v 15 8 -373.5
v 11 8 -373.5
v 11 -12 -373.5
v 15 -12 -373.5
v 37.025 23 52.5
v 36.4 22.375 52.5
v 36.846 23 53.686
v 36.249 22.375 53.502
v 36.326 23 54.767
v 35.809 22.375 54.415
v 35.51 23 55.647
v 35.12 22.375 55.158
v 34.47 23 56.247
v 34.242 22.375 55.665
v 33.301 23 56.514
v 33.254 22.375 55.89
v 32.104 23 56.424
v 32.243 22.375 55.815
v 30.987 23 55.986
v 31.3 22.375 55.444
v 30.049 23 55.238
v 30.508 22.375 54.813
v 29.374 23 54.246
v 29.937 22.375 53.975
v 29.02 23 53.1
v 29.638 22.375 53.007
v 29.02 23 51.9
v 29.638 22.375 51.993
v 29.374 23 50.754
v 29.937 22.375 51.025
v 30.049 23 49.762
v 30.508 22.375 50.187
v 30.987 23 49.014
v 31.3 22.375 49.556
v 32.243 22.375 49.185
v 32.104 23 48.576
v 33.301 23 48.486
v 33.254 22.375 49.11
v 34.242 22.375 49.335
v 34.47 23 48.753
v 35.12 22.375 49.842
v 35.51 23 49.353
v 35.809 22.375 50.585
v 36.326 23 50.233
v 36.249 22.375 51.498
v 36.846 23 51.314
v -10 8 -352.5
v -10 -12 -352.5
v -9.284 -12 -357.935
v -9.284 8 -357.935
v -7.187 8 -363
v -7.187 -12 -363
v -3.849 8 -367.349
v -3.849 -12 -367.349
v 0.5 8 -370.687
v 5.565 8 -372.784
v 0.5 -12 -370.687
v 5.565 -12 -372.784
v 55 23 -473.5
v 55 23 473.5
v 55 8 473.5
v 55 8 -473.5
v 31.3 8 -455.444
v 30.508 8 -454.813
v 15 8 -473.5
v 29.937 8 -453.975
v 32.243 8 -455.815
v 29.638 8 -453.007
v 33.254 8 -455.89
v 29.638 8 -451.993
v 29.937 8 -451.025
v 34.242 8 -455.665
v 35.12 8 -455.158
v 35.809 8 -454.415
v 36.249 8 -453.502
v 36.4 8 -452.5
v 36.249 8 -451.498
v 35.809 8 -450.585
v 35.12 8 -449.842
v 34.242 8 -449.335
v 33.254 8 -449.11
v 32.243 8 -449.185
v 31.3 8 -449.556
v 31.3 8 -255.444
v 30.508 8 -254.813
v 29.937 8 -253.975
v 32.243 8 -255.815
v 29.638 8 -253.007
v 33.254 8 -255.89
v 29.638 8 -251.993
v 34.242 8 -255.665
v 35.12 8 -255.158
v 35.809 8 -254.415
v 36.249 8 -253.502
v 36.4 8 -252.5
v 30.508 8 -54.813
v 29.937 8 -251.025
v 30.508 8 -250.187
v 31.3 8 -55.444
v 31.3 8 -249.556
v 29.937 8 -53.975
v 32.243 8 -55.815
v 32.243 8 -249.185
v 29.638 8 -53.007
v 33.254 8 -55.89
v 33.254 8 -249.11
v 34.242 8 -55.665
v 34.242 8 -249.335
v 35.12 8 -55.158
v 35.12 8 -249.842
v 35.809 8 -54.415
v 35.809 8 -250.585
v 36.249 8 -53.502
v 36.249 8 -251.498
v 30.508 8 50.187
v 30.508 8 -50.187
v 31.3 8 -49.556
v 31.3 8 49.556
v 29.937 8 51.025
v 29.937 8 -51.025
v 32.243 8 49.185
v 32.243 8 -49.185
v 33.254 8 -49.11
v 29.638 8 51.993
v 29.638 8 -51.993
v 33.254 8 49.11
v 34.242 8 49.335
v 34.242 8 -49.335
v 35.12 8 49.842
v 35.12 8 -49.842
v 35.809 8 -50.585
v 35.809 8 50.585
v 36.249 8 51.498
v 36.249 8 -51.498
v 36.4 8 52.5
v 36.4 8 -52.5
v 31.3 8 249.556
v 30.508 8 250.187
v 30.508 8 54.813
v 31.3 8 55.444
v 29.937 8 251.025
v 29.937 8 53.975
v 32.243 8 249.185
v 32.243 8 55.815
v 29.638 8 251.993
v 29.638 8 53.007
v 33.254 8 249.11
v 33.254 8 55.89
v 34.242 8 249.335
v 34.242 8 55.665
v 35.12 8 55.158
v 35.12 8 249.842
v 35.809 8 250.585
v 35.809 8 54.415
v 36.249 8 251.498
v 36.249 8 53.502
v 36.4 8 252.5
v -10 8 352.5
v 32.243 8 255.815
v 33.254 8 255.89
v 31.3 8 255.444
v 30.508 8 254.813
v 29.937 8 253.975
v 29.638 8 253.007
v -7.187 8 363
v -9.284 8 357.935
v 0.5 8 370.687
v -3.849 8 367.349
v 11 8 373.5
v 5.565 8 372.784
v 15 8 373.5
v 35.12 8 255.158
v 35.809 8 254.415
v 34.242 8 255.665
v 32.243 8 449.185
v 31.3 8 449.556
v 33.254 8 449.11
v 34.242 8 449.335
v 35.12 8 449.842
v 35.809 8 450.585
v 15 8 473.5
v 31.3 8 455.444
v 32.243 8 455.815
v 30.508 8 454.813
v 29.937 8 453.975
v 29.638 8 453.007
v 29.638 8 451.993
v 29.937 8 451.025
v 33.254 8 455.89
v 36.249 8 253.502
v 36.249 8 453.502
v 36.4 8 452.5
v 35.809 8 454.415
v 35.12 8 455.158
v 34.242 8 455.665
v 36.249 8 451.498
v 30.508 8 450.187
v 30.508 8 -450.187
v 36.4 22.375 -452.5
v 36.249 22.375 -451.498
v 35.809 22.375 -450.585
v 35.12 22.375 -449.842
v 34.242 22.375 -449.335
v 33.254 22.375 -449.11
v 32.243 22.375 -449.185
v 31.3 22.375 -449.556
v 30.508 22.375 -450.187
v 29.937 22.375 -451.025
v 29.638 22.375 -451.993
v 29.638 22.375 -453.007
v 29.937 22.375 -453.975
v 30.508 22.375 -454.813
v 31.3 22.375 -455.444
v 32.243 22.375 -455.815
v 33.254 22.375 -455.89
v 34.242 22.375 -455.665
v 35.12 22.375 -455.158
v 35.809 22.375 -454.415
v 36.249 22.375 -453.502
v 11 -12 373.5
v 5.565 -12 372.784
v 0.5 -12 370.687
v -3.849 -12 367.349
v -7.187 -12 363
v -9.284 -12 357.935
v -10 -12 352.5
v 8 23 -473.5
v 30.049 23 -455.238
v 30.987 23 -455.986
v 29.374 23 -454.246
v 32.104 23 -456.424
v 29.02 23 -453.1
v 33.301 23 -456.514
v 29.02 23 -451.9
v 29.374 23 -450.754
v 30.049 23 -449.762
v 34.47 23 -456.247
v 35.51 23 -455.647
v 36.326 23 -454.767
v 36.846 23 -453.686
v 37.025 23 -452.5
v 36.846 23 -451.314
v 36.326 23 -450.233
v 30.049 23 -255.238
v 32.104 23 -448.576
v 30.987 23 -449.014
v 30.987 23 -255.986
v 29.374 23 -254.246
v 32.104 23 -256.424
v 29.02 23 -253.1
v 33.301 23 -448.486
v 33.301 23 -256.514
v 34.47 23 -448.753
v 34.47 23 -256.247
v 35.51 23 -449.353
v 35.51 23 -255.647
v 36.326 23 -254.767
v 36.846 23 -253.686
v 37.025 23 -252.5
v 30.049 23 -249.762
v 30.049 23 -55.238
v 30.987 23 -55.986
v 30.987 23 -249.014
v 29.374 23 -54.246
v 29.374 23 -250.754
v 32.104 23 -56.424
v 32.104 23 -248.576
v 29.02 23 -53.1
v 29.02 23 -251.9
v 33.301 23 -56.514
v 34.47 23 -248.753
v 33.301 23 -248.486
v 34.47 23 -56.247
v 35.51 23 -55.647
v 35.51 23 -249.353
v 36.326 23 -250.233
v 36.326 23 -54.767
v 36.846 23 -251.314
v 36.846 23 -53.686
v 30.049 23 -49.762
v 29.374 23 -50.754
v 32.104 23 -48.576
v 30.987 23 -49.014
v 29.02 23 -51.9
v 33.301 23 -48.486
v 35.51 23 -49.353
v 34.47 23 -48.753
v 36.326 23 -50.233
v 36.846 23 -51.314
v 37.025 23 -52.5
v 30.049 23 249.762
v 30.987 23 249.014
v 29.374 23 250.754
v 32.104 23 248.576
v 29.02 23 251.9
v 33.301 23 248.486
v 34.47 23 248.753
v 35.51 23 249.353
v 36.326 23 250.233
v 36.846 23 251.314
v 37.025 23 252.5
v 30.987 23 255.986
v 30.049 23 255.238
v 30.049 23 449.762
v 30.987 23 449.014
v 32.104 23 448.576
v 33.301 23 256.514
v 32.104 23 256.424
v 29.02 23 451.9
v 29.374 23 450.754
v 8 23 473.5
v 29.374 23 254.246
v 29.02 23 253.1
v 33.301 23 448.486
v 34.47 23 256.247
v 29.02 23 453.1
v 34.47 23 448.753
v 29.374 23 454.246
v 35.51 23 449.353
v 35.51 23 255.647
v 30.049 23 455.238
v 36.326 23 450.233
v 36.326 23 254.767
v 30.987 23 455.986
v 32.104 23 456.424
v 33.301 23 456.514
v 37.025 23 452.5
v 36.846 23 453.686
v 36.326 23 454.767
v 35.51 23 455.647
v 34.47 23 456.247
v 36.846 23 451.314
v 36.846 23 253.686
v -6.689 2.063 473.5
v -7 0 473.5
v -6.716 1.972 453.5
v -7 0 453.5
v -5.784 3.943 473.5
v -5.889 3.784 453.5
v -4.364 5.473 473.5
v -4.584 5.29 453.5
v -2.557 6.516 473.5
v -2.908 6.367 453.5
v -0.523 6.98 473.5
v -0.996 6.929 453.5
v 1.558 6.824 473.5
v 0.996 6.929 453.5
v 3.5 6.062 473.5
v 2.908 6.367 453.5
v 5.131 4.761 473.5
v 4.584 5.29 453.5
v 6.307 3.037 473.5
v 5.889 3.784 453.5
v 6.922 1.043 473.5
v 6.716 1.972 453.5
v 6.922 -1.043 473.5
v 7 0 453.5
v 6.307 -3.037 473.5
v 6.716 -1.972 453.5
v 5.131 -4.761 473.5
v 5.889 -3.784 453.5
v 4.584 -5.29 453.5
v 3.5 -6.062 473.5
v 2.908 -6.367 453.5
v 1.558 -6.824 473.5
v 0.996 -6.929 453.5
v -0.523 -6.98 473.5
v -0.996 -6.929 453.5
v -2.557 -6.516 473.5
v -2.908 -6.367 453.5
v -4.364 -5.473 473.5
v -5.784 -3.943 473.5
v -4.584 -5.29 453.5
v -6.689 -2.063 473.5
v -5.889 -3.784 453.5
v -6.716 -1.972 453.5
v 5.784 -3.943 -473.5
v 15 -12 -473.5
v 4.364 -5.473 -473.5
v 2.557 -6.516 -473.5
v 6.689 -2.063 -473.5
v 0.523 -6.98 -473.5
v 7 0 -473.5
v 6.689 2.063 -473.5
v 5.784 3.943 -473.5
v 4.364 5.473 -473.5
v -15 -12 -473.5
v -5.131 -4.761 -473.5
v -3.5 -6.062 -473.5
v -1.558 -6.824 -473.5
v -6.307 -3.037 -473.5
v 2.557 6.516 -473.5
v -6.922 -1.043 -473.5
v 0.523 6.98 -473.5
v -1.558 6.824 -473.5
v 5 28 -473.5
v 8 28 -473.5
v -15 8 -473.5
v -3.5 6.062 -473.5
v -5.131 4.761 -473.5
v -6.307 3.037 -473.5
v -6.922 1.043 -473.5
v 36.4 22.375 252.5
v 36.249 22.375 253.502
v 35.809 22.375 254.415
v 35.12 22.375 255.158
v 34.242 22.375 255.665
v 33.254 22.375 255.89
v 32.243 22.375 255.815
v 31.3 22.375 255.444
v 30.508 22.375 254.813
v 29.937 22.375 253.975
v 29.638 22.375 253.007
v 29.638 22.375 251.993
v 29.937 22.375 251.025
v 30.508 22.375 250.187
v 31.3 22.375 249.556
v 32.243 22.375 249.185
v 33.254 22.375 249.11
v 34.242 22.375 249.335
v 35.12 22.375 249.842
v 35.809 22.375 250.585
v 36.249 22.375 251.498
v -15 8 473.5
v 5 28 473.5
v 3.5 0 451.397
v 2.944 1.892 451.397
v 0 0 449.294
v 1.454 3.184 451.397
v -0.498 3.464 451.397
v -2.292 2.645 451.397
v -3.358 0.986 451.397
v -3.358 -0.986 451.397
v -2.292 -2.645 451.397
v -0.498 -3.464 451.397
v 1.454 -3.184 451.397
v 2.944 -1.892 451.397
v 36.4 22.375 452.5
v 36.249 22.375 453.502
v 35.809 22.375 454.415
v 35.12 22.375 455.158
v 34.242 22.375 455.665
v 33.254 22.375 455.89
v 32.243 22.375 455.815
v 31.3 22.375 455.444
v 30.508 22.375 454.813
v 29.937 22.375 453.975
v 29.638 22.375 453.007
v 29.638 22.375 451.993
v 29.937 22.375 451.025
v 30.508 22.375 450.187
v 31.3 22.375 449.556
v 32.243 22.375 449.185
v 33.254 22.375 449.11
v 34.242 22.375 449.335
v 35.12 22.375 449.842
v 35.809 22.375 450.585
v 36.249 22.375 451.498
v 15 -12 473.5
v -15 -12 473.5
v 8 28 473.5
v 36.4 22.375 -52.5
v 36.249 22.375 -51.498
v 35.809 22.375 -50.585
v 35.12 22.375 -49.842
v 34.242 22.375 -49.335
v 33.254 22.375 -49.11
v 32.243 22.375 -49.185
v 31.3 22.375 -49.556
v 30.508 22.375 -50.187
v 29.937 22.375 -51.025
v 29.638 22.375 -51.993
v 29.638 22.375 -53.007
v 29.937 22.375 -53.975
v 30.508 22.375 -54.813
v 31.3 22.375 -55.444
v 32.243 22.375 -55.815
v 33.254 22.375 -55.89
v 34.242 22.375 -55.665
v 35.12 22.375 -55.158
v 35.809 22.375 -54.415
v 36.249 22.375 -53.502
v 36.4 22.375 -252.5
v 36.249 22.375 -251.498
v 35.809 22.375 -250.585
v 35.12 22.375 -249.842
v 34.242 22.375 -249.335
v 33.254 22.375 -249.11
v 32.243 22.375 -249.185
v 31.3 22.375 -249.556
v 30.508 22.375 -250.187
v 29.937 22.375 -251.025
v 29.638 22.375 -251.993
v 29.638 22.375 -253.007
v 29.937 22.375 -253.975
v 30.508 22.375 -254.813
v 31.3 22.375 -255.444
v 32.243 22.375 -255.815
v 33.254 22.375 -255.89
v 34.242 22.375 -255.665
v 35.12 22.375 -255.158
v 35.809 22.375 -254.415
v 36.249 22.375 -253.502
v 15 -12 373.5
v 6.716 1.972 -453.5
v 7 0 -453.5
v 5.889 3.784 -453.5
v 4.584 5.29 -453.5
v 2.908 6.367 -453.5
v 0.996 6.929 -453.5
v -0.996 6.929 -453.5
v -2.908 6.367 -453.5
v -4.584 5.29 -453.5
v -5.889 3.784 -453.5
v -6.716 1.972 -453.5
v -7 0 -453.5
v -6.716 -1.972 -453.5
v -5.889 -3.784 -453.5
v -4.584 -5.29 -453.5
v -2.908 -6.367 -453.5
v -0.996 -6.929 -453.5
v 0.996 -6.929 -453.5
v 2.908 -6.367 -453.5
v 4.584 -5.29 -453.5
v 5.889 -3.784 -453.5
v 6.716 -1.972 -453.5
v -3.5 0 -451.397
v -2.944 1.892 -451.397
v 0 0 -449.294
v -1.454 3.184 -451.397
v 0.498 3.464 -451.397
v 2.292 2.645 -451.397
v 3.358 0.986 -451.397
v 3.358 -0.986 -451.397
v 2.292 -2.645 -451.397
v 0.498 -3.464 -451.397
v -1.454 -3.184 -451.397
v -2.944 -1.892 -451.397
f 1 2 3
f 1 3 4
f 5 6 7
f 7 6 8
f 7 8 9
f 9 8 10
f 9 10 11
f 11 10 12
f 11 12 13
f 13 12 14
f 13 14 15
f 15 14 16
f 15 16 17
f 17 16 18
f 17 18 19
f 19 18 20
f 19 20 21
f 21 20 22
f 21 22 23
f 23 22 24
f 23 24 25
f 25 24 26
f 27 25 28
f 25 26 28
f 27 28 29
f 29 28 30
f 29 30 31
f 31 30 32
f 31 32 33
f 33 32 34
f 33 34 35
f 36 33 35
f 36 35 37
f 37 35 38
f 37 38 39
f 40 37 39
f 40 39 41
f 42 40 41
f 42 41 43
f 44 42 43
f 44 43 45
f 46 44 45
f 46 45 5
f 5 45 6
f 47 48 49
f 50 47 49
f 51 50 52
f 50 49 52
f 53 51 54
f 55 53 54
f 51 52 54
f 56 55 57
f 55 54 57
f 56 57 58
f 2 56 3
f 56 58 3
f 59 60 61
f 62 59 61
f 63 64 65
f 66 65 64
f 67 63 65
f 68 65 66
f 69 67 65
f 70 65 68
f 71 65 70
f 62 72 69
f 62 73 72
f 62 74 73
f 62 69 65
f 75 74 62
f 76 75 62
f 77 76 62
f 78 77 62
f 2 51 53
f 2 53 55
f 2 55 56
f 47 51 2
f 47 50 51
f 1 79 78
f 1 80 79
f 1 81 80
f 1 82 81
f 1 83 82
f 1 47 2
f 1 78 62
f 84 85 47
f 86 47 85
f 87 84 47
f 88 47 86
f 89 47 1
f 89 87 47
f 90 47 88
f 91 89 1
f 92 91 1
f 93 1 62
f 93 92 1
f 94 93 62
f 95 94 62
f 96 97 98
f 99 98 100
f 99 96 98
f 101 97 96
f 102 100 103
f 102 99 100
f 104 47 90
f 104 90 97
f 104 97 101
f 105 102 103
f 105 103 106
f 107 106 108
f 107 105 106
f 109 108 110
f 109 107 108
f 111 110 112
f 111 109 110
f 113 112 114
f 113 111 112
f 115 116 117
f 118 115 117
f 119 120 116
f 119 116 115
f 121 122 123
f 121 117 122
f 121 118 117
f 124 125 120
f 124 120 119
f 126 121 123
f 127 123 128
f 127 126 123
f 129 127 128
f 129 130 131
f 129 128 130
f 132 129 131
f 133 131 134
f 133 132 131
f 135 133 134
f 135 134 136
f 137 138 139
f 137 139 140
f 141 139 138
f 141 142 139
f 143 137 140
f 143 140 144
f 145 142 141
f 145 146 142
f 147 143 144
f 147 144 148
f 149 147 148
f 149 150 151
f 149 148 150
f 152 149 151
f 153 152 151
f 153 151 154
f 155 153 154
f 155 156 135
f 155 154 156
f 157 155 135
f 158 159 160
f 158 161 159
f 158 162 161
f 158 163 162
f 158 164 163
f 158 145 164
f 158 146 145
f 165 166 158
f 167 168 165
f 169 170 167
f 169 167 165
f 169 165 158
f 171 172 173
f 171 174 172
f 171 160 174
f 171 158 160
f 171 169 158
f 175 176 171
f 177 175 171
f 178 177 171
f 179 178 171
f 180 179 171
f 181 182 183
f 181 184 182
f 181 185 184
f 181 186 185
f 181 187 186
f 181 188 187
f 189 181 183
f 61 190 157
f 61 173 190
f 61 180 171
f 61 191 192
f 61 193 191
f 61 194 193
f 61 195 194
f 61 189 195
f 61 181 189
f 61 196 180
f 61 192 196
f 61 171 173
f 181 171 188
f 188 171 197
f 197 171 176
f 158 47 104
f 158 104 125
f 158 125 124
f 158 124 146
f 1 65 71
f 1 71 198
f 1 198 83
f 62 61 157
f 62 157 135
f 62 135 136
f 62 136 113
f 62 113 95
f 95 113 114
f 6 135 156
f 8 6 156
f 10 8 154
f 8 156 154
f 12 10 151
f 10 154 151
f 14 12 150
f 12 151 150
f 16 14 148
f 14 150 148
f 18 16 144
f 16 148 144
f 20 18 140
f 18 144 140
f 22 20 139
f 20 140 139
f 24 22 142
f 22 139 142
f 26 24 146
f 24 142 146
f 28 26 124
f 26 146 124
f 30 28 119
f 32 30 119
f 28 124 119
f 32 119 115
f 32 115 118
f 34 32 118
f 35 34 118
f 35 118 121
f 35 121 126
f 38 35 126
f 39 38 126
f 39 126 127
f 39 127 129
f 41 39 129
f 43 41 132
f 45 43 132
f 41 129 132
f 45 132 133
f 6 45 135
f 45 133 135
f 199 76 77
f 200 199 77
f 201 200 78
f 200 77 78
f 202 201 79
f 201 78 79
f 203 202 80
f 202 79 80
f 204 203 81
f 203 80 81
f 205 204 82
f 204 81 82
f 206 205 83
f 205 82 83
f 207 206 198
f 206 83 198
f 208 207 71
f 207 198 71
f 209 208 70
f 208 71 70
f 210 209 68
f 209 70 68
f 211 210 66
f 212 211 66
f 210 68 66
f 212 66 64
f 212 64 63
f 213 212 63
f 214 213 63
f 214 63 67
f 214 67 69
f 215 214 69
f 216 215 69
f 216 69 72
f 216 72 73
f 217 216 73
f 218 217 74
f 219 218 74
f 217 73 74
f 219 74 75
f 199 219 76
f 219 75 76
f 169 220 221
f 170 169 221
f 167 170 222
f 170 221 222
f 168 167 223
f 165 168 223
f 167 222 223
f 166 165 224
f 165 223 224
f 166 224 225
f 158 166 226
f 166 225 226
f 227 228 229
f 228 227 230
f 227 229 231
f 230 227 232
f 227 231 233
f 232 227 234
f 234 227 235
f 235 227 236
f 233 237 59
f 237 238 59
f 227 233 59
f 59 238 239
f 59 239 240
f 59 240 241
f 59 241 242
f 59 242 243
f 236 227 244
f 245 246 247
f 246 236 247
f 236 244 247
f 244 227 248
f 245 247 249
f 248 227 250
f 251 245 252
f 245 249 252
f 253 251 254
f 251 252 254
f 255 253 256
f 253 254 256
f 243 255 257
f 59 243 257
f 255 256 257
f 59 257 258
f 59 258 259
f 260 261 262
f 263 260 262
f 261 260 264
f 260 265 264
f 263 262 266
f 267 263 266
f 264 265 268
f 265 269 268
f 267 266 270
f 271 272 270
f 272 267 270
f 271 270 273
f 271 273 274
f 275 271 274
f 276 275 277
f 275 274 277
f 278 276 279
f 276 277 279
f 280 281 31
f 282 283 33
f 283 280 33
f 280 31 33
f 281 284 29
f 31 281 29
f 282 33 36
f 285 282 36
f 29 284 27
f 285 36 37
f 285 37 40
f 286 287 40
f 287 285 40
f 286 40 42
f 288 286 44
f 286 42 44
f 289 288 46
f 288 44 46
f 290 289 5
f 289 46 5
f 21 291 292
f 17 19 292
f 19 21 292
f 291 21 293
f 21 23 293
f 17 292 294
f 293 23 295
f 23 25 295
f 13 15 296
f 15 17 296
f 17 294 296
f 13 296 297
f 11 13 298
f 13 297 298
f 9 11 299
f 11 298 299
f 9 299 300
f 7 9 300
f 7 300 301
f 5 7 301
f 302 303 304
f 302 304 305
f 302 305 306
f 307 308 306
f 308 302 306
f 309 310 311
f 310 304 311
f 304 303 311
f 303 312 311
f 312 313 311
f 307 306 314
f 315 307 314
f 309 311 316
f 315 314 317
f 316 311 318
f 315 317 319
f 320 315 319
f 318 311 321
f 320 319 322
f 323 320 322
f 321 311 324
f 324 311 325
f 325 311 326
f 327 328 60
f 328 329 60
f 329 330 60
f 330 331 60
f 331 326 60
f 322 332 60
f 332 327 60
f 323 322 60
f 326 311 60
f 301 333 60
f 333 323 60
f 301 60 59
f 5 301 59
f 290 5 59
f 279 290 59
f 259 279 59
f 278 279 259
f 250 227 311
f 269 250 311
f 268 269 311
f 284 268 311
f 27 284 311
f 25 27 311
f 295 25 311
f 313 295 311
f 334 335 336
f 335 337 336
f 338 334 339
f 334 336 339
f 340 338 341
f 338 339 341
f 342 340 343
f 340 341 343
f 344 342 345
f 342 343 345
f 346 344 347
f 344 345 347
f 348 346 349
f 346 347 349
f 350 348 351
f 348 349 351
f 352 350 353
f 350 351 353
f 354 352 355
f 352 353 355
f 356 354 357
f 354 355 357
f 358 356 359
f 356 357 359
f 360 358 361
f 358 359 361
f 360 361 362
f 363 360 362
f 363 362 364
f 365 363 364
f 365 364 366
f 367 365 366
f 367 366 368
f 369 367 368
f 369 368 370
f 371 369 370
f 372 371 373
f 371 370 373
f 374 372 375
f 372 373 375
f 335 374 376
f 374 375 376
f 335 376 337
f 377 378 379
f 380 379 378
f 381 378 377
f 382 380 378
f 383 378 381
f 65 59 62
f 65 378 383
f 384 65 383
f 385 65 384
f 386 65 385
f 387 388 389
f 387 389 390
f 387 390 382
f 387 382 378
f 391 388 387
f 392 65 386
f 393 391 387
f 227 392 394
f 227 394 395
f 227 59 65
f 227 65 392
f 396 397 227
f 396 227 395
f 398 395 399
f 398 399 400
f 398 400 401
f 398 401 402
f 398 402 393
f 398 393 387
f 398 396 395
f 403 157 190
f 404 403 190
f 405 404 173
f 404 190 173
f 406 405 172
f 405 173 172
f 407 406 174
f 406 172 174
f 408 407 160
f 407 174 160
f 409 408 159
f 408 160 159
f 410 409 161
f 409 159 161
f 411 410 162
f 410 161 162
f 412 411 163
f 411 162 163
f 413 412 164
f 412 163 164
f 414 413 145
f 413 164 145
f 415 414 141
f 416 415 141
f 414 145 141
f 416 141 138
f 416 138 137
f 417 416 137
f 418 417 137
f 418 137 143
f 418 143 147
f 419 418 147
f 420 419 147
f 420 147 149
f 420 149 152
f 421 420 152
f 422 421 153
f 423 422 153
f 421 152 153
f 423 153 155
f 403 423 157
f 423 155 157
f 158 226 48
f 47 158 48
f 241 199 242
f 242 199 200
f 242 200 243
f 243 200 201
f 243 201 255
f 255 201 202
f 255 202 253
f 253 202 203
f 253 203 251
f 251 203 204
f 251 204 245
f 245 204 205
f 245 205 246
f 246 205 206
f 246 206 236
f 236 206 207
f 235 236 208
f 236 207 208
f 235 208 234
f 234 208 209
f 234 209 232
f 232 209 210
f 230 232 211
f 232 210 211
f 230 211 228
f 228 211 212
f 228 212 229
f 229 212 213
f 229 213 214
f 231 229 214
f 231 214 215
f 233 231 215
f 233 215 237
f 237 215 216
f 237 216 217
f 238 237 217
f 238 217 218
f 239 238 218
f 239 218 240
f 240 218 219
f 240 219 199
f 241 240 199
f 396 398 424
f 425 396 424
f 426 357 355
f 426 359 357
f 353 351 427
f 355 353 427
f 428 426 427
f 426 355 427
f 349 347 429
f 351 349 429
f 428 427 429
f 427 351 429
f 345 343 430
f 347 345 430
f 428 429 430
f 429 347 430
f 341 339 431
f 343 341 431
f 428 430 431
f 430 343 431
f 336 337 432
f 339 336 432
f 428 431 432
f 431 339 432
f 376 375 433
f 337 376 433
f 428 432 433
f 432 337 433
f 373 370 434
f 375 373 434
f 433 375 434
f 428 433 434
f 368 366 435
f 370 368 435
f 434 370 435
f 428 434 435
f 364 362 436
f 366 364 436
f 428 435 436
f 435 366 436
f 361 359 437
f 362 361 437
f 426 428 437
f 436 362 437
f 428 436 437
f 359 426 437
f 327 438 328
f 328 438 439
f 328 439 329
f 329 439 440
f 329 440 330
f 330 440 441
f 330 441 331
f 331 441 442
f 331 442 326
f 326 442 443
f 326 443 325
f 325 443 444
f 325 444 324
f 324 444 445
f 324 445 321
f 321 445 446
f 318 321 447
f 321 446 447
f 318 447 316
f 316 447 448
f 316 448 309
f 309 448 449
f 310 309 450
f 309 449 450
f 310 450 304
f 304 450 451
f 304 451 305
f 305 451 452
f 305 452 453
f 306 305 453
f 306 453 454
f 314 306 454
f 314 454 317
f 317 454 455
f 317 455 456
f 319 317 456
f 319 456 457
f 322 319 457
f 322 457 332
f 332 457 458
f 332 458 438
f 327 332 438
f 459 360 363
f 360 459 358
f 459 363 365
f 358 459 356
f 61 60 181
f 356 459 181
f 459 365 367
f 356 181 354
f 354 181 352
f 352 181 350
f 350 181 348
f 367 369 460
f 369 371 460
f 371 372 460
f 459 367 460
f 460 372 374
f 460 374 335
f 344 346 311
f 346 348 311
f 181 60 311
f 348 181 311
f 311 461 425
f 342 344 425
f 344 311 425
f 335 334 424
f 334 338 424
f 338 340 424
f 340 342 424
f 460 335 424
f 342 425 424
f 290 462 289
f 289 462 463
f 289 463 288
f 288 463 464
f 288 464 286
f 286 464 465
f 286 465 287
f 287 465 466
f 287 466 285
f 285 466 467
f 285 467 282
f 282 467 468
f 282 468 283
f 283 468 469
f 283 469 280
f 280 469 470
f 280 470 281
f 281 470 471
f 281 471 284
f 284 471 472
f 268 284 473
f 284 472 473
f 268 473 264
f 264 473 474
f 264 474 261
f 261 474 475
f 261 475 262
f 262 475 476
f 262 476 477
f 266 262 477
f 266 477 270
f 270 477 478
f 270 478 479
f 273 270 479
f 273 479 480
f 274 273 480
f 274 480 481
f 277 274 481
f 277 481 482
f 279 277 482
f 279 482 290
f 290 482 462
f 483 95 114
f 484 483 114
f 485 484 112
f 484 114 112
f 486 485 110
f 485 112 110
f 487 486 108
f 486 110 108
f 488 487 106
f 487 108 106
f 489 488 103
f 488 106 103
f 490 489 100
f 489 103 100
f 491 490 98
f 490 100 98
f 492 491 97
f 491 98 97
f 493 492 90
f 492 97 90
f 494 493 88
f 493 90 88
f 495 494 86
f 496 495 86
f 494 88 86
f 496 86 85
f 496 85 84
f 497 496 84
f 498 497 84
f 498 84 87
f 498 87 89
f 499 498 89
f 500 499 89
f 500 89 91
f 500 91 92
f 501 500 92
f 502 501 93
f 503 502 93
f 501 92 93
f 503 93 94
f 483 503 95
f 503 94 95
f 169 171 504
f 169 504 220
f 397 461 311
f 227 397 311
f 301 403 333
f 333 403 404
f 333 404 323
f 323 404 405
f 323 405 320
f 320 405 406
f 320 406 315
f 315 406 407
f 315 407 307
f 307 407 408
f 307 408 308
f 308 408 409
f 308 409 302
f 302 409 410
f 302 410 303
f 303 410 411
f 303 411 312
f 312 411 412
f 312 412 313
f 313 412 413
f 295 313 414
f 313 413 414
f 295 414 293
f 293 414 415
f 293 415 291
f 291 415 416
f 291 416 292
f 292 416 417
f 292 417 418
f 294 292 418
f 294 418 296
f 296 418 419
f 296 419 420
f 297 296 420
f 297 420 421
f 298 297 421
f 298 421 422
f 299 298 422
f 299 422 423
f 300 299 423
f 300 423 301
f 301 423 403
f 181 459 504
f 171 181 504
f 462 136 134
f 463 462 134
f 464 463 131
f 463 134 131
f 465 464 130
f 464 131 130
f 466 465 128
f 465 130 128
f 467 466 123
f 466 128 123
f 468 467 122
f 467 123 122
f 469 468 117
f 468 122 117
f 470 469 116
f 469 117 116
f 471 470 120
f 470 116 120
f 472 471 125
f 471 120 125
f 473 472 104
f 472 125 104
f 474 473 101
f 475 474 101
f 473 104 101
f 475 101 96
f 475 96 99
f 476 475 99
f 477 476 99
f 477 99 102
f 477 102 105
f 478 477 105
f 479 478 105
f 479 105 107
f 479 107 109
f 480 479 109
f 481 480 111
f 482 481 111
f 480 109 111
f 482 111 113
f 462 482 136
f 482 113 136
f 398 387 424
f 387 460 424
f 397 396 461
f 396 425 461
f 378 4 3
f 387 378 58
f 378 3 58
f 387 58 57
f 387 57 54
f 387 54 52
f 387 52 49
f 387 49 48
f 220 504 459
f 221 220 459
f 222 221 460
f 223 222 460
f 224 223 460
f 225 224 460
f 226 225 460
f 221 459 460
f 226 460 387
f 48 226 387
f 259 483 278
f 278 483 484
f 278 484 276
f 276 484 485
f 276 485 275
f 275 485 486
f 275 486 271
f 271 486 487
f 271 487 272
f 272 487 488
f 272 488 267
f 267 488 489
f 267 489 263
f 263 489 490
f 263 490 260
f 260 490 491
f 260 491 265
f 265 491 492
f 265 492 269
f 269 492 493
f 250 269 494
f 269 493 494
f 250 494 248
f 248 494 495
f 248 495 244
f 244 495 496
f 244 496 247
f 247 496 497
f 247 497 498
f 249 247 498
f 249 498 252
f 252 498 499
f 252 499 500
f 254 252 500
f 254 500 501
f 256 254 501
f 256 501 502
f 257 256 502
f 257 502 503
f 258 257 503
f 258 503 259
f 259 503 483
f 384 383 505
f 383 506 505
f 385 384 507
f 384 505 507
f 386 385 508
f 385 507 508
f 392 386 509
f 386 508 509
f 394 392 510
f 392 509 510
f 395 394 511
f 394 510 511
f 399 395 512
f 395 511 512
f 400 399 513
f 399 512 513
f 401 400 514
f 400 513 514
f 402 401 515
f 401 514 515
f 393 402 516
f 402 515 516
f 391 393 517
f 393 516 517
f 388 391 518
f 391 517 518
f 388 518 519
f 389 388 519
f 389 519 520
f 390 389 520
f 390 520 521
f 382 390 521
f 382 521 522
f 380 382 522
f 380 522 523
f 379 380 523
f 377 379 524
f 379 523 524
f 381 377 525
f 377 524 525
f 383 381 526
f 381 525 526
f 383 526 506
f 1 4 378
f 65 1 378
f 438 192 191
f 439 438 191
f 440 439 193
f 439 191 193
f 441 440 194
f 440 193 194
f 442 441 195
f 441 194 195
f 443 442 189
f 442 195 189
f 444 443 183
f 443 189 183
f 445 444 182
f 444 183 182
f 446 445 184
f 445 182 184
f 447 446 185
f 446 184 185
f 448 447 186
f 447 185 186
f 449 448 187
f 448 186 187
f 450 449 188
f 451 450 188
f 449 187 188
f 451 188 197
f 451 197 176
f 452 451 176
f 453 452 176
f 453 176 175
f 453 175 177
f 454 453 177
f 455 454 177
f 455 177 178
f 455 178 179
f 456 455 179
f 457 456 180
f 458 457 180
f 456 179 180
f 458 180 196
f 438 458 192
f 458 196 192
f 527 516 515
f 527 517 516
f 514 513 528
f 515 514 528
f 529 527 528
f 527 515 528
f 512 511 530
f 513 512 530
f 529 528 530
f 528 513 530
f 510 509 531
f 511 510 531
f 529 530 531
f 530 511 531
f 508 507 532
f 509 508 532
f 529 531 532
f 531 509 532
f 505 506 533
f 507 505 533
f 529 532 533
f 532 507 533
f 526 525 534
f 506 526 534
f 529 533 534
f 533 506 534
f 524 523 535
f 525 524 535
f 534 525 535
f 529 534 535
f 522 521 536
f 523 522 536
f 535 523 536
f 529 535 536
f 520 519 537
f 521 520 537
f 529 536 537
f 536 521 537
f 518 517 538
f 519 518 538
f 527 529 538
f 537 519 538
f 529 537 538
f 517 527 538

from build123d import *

# Parameters (mm, degrees)
LINEAR_AUSTRAGEN1_DEPTH              = 473.5
M8_GEWINDEBOHRUNG1_D                 = 6.8
M8_GEWINDEBOHRUNG1_CSINK_D           = 8.05
M8_GEWINDEBOHRUNG1_CSINK_ANGLE       = 90
SCHNITT_LINEAR_AUSTRAGEN2_DEPTH      = 20
FASE1_SIZE                           = 20
F_14_0_14_DURCHMESSER_BOHRUNG1_D     = 14
F_14_0_14_DURCHMESSER_BOHRUNG1_DEPTH = 20
F_14_0_14_DURCHMESSER_BOHRUNG1_TIP   = 4.206024333
F_14_0_14_DURCHMESSER_BOHRUNG2_D     = 14
F_14_0_14_DURCHMESSER_BOHRUNG2_DEPTH = 20
F_14_0_14_DURCHMESSER_BOHRUNG2_TIP   = 4.206024333


with BuildPart() as part:
    # Skizze1 → Linear austragen1 (new, symmetric)
    with BuildSketch(Plane.XY):
        Polygon((8, 28), (8, 23), (55, 23), (55, -12), (-15, -12), (-15, 28), align=None)
    extrude(amount=LINEAR_AUSTRAGEN1_DEPTH, both=True)

    # M8 Gewindebohrung1 (through all)
    with Locations(Plane(origin=(0, 23, 0), x_dir=(-1, 0, 0), z_dir=(0, 1, 0))):
        with Locations((-33, 452.5), (-33, -52.5), (-33, 252.5), (-33, -252.5), (-33, 52.5), (-33, -452.5)):
            CounterSinkHole(M8_GEWINDEBOHRUNG1_D / 2, M8_GEWINDEBOHRUNG1_CSINK_D / 2, counter_sink_angle=M8_GEWINDEBOHRUNG1_CSINK_ANGLE)

    # Skizze20 → Schnitt-Linear austragen2 (cut)
    with BuildSketch(Plane.XZ.offset(12)):
        with BuildLine():
            Line((55, 473.5), (15, 473.5))
            Line((15, 473.5), (15, 373.5))
            Line((15, 373.5), (11, 373.5))
            ThreePointArc((11, 373.5), (-3.849242405, 367.349242405), (-10, 352.5))
            Line((-10, 352.5), (-10, -352.5))
            ThreePointArc((-10, -352.5), (-3.849242405, -367.349242405), (11, -373.5))
            Line((11, -373.5), (15, -373.5))
            Line((15, -373.5), (15, -473.5))
            Line((15, -473.5), (55, -473.5))
            Line((55, -473.5), (55, 473.5))
        make_face()
    extrude(amount=-SCHNITT_LINEAR_AUSTRAGEN2_DEPTH, mode=Mode.SUBTRACT)

    # Fase1
    fase1_edges = [part.edges().sort_by_distance(p)[0] for p in [
        (-15, 28, 0),
    ]]
    chamfer(fase1_edges, length=FASE1_SIZE)

    # Ø14.0 (14) Durchmesser Bohrung1
    with Locations(Plane.XY.offset(473.5)):
        with Locations((0, 0)):
            Hole(F_14_0_14_DURCHMESSER_BOHRUNG1_D / 2, depth=F_14_0_14_DURCHMESSER_BOHRUNG1_DEPTH)
            with Locations((0, 0, -(F_14_0_14_DURCHMESSER_BOHRUNG1_DEPTH + F_14_0_14_DURCHMESSER_BOHRUNG1_TIP / 2))):  # 118° drill point
                Cone(0, F_14_0_14_DURCHMESSER_BOHRUNG1_D / 2, F_14_0_14_DURCHMESSER_BOHRUNG1_TIP, mode=Mode.SUBTRACT)

    # Ø14.0 (14) Durchmesser Bohrung2
    with Locations(Plane(origin=(0, 0, -473.5), x_dir=(-1, 0, 0), z_dir=(0, 0, -1))):
        with Locations((0, 0)):
            Hole(F_14_0_14_DURCHMESSER_BOHRUNG2_D / 2, depth=F_14_0_14_DURCHMESSER_BOHRUNG2_DEPTH)
            with Locations((0, 0, -(F_14_0_14_DURCHMESSER_BOHRUNG2_DEPTH + F_14_0_14_DURCHMESSER_BOHRUNG2_TIP / 2))):  # 118° drill point
                Cone(0, F_14_0_14_DURCHMESSER_BOHRUNG2_D / 2, F_14_0_14_DURCHMESSER_BOHRUNG2_TIP, mode=Mode.SUBTRACT)


solid = part.part
